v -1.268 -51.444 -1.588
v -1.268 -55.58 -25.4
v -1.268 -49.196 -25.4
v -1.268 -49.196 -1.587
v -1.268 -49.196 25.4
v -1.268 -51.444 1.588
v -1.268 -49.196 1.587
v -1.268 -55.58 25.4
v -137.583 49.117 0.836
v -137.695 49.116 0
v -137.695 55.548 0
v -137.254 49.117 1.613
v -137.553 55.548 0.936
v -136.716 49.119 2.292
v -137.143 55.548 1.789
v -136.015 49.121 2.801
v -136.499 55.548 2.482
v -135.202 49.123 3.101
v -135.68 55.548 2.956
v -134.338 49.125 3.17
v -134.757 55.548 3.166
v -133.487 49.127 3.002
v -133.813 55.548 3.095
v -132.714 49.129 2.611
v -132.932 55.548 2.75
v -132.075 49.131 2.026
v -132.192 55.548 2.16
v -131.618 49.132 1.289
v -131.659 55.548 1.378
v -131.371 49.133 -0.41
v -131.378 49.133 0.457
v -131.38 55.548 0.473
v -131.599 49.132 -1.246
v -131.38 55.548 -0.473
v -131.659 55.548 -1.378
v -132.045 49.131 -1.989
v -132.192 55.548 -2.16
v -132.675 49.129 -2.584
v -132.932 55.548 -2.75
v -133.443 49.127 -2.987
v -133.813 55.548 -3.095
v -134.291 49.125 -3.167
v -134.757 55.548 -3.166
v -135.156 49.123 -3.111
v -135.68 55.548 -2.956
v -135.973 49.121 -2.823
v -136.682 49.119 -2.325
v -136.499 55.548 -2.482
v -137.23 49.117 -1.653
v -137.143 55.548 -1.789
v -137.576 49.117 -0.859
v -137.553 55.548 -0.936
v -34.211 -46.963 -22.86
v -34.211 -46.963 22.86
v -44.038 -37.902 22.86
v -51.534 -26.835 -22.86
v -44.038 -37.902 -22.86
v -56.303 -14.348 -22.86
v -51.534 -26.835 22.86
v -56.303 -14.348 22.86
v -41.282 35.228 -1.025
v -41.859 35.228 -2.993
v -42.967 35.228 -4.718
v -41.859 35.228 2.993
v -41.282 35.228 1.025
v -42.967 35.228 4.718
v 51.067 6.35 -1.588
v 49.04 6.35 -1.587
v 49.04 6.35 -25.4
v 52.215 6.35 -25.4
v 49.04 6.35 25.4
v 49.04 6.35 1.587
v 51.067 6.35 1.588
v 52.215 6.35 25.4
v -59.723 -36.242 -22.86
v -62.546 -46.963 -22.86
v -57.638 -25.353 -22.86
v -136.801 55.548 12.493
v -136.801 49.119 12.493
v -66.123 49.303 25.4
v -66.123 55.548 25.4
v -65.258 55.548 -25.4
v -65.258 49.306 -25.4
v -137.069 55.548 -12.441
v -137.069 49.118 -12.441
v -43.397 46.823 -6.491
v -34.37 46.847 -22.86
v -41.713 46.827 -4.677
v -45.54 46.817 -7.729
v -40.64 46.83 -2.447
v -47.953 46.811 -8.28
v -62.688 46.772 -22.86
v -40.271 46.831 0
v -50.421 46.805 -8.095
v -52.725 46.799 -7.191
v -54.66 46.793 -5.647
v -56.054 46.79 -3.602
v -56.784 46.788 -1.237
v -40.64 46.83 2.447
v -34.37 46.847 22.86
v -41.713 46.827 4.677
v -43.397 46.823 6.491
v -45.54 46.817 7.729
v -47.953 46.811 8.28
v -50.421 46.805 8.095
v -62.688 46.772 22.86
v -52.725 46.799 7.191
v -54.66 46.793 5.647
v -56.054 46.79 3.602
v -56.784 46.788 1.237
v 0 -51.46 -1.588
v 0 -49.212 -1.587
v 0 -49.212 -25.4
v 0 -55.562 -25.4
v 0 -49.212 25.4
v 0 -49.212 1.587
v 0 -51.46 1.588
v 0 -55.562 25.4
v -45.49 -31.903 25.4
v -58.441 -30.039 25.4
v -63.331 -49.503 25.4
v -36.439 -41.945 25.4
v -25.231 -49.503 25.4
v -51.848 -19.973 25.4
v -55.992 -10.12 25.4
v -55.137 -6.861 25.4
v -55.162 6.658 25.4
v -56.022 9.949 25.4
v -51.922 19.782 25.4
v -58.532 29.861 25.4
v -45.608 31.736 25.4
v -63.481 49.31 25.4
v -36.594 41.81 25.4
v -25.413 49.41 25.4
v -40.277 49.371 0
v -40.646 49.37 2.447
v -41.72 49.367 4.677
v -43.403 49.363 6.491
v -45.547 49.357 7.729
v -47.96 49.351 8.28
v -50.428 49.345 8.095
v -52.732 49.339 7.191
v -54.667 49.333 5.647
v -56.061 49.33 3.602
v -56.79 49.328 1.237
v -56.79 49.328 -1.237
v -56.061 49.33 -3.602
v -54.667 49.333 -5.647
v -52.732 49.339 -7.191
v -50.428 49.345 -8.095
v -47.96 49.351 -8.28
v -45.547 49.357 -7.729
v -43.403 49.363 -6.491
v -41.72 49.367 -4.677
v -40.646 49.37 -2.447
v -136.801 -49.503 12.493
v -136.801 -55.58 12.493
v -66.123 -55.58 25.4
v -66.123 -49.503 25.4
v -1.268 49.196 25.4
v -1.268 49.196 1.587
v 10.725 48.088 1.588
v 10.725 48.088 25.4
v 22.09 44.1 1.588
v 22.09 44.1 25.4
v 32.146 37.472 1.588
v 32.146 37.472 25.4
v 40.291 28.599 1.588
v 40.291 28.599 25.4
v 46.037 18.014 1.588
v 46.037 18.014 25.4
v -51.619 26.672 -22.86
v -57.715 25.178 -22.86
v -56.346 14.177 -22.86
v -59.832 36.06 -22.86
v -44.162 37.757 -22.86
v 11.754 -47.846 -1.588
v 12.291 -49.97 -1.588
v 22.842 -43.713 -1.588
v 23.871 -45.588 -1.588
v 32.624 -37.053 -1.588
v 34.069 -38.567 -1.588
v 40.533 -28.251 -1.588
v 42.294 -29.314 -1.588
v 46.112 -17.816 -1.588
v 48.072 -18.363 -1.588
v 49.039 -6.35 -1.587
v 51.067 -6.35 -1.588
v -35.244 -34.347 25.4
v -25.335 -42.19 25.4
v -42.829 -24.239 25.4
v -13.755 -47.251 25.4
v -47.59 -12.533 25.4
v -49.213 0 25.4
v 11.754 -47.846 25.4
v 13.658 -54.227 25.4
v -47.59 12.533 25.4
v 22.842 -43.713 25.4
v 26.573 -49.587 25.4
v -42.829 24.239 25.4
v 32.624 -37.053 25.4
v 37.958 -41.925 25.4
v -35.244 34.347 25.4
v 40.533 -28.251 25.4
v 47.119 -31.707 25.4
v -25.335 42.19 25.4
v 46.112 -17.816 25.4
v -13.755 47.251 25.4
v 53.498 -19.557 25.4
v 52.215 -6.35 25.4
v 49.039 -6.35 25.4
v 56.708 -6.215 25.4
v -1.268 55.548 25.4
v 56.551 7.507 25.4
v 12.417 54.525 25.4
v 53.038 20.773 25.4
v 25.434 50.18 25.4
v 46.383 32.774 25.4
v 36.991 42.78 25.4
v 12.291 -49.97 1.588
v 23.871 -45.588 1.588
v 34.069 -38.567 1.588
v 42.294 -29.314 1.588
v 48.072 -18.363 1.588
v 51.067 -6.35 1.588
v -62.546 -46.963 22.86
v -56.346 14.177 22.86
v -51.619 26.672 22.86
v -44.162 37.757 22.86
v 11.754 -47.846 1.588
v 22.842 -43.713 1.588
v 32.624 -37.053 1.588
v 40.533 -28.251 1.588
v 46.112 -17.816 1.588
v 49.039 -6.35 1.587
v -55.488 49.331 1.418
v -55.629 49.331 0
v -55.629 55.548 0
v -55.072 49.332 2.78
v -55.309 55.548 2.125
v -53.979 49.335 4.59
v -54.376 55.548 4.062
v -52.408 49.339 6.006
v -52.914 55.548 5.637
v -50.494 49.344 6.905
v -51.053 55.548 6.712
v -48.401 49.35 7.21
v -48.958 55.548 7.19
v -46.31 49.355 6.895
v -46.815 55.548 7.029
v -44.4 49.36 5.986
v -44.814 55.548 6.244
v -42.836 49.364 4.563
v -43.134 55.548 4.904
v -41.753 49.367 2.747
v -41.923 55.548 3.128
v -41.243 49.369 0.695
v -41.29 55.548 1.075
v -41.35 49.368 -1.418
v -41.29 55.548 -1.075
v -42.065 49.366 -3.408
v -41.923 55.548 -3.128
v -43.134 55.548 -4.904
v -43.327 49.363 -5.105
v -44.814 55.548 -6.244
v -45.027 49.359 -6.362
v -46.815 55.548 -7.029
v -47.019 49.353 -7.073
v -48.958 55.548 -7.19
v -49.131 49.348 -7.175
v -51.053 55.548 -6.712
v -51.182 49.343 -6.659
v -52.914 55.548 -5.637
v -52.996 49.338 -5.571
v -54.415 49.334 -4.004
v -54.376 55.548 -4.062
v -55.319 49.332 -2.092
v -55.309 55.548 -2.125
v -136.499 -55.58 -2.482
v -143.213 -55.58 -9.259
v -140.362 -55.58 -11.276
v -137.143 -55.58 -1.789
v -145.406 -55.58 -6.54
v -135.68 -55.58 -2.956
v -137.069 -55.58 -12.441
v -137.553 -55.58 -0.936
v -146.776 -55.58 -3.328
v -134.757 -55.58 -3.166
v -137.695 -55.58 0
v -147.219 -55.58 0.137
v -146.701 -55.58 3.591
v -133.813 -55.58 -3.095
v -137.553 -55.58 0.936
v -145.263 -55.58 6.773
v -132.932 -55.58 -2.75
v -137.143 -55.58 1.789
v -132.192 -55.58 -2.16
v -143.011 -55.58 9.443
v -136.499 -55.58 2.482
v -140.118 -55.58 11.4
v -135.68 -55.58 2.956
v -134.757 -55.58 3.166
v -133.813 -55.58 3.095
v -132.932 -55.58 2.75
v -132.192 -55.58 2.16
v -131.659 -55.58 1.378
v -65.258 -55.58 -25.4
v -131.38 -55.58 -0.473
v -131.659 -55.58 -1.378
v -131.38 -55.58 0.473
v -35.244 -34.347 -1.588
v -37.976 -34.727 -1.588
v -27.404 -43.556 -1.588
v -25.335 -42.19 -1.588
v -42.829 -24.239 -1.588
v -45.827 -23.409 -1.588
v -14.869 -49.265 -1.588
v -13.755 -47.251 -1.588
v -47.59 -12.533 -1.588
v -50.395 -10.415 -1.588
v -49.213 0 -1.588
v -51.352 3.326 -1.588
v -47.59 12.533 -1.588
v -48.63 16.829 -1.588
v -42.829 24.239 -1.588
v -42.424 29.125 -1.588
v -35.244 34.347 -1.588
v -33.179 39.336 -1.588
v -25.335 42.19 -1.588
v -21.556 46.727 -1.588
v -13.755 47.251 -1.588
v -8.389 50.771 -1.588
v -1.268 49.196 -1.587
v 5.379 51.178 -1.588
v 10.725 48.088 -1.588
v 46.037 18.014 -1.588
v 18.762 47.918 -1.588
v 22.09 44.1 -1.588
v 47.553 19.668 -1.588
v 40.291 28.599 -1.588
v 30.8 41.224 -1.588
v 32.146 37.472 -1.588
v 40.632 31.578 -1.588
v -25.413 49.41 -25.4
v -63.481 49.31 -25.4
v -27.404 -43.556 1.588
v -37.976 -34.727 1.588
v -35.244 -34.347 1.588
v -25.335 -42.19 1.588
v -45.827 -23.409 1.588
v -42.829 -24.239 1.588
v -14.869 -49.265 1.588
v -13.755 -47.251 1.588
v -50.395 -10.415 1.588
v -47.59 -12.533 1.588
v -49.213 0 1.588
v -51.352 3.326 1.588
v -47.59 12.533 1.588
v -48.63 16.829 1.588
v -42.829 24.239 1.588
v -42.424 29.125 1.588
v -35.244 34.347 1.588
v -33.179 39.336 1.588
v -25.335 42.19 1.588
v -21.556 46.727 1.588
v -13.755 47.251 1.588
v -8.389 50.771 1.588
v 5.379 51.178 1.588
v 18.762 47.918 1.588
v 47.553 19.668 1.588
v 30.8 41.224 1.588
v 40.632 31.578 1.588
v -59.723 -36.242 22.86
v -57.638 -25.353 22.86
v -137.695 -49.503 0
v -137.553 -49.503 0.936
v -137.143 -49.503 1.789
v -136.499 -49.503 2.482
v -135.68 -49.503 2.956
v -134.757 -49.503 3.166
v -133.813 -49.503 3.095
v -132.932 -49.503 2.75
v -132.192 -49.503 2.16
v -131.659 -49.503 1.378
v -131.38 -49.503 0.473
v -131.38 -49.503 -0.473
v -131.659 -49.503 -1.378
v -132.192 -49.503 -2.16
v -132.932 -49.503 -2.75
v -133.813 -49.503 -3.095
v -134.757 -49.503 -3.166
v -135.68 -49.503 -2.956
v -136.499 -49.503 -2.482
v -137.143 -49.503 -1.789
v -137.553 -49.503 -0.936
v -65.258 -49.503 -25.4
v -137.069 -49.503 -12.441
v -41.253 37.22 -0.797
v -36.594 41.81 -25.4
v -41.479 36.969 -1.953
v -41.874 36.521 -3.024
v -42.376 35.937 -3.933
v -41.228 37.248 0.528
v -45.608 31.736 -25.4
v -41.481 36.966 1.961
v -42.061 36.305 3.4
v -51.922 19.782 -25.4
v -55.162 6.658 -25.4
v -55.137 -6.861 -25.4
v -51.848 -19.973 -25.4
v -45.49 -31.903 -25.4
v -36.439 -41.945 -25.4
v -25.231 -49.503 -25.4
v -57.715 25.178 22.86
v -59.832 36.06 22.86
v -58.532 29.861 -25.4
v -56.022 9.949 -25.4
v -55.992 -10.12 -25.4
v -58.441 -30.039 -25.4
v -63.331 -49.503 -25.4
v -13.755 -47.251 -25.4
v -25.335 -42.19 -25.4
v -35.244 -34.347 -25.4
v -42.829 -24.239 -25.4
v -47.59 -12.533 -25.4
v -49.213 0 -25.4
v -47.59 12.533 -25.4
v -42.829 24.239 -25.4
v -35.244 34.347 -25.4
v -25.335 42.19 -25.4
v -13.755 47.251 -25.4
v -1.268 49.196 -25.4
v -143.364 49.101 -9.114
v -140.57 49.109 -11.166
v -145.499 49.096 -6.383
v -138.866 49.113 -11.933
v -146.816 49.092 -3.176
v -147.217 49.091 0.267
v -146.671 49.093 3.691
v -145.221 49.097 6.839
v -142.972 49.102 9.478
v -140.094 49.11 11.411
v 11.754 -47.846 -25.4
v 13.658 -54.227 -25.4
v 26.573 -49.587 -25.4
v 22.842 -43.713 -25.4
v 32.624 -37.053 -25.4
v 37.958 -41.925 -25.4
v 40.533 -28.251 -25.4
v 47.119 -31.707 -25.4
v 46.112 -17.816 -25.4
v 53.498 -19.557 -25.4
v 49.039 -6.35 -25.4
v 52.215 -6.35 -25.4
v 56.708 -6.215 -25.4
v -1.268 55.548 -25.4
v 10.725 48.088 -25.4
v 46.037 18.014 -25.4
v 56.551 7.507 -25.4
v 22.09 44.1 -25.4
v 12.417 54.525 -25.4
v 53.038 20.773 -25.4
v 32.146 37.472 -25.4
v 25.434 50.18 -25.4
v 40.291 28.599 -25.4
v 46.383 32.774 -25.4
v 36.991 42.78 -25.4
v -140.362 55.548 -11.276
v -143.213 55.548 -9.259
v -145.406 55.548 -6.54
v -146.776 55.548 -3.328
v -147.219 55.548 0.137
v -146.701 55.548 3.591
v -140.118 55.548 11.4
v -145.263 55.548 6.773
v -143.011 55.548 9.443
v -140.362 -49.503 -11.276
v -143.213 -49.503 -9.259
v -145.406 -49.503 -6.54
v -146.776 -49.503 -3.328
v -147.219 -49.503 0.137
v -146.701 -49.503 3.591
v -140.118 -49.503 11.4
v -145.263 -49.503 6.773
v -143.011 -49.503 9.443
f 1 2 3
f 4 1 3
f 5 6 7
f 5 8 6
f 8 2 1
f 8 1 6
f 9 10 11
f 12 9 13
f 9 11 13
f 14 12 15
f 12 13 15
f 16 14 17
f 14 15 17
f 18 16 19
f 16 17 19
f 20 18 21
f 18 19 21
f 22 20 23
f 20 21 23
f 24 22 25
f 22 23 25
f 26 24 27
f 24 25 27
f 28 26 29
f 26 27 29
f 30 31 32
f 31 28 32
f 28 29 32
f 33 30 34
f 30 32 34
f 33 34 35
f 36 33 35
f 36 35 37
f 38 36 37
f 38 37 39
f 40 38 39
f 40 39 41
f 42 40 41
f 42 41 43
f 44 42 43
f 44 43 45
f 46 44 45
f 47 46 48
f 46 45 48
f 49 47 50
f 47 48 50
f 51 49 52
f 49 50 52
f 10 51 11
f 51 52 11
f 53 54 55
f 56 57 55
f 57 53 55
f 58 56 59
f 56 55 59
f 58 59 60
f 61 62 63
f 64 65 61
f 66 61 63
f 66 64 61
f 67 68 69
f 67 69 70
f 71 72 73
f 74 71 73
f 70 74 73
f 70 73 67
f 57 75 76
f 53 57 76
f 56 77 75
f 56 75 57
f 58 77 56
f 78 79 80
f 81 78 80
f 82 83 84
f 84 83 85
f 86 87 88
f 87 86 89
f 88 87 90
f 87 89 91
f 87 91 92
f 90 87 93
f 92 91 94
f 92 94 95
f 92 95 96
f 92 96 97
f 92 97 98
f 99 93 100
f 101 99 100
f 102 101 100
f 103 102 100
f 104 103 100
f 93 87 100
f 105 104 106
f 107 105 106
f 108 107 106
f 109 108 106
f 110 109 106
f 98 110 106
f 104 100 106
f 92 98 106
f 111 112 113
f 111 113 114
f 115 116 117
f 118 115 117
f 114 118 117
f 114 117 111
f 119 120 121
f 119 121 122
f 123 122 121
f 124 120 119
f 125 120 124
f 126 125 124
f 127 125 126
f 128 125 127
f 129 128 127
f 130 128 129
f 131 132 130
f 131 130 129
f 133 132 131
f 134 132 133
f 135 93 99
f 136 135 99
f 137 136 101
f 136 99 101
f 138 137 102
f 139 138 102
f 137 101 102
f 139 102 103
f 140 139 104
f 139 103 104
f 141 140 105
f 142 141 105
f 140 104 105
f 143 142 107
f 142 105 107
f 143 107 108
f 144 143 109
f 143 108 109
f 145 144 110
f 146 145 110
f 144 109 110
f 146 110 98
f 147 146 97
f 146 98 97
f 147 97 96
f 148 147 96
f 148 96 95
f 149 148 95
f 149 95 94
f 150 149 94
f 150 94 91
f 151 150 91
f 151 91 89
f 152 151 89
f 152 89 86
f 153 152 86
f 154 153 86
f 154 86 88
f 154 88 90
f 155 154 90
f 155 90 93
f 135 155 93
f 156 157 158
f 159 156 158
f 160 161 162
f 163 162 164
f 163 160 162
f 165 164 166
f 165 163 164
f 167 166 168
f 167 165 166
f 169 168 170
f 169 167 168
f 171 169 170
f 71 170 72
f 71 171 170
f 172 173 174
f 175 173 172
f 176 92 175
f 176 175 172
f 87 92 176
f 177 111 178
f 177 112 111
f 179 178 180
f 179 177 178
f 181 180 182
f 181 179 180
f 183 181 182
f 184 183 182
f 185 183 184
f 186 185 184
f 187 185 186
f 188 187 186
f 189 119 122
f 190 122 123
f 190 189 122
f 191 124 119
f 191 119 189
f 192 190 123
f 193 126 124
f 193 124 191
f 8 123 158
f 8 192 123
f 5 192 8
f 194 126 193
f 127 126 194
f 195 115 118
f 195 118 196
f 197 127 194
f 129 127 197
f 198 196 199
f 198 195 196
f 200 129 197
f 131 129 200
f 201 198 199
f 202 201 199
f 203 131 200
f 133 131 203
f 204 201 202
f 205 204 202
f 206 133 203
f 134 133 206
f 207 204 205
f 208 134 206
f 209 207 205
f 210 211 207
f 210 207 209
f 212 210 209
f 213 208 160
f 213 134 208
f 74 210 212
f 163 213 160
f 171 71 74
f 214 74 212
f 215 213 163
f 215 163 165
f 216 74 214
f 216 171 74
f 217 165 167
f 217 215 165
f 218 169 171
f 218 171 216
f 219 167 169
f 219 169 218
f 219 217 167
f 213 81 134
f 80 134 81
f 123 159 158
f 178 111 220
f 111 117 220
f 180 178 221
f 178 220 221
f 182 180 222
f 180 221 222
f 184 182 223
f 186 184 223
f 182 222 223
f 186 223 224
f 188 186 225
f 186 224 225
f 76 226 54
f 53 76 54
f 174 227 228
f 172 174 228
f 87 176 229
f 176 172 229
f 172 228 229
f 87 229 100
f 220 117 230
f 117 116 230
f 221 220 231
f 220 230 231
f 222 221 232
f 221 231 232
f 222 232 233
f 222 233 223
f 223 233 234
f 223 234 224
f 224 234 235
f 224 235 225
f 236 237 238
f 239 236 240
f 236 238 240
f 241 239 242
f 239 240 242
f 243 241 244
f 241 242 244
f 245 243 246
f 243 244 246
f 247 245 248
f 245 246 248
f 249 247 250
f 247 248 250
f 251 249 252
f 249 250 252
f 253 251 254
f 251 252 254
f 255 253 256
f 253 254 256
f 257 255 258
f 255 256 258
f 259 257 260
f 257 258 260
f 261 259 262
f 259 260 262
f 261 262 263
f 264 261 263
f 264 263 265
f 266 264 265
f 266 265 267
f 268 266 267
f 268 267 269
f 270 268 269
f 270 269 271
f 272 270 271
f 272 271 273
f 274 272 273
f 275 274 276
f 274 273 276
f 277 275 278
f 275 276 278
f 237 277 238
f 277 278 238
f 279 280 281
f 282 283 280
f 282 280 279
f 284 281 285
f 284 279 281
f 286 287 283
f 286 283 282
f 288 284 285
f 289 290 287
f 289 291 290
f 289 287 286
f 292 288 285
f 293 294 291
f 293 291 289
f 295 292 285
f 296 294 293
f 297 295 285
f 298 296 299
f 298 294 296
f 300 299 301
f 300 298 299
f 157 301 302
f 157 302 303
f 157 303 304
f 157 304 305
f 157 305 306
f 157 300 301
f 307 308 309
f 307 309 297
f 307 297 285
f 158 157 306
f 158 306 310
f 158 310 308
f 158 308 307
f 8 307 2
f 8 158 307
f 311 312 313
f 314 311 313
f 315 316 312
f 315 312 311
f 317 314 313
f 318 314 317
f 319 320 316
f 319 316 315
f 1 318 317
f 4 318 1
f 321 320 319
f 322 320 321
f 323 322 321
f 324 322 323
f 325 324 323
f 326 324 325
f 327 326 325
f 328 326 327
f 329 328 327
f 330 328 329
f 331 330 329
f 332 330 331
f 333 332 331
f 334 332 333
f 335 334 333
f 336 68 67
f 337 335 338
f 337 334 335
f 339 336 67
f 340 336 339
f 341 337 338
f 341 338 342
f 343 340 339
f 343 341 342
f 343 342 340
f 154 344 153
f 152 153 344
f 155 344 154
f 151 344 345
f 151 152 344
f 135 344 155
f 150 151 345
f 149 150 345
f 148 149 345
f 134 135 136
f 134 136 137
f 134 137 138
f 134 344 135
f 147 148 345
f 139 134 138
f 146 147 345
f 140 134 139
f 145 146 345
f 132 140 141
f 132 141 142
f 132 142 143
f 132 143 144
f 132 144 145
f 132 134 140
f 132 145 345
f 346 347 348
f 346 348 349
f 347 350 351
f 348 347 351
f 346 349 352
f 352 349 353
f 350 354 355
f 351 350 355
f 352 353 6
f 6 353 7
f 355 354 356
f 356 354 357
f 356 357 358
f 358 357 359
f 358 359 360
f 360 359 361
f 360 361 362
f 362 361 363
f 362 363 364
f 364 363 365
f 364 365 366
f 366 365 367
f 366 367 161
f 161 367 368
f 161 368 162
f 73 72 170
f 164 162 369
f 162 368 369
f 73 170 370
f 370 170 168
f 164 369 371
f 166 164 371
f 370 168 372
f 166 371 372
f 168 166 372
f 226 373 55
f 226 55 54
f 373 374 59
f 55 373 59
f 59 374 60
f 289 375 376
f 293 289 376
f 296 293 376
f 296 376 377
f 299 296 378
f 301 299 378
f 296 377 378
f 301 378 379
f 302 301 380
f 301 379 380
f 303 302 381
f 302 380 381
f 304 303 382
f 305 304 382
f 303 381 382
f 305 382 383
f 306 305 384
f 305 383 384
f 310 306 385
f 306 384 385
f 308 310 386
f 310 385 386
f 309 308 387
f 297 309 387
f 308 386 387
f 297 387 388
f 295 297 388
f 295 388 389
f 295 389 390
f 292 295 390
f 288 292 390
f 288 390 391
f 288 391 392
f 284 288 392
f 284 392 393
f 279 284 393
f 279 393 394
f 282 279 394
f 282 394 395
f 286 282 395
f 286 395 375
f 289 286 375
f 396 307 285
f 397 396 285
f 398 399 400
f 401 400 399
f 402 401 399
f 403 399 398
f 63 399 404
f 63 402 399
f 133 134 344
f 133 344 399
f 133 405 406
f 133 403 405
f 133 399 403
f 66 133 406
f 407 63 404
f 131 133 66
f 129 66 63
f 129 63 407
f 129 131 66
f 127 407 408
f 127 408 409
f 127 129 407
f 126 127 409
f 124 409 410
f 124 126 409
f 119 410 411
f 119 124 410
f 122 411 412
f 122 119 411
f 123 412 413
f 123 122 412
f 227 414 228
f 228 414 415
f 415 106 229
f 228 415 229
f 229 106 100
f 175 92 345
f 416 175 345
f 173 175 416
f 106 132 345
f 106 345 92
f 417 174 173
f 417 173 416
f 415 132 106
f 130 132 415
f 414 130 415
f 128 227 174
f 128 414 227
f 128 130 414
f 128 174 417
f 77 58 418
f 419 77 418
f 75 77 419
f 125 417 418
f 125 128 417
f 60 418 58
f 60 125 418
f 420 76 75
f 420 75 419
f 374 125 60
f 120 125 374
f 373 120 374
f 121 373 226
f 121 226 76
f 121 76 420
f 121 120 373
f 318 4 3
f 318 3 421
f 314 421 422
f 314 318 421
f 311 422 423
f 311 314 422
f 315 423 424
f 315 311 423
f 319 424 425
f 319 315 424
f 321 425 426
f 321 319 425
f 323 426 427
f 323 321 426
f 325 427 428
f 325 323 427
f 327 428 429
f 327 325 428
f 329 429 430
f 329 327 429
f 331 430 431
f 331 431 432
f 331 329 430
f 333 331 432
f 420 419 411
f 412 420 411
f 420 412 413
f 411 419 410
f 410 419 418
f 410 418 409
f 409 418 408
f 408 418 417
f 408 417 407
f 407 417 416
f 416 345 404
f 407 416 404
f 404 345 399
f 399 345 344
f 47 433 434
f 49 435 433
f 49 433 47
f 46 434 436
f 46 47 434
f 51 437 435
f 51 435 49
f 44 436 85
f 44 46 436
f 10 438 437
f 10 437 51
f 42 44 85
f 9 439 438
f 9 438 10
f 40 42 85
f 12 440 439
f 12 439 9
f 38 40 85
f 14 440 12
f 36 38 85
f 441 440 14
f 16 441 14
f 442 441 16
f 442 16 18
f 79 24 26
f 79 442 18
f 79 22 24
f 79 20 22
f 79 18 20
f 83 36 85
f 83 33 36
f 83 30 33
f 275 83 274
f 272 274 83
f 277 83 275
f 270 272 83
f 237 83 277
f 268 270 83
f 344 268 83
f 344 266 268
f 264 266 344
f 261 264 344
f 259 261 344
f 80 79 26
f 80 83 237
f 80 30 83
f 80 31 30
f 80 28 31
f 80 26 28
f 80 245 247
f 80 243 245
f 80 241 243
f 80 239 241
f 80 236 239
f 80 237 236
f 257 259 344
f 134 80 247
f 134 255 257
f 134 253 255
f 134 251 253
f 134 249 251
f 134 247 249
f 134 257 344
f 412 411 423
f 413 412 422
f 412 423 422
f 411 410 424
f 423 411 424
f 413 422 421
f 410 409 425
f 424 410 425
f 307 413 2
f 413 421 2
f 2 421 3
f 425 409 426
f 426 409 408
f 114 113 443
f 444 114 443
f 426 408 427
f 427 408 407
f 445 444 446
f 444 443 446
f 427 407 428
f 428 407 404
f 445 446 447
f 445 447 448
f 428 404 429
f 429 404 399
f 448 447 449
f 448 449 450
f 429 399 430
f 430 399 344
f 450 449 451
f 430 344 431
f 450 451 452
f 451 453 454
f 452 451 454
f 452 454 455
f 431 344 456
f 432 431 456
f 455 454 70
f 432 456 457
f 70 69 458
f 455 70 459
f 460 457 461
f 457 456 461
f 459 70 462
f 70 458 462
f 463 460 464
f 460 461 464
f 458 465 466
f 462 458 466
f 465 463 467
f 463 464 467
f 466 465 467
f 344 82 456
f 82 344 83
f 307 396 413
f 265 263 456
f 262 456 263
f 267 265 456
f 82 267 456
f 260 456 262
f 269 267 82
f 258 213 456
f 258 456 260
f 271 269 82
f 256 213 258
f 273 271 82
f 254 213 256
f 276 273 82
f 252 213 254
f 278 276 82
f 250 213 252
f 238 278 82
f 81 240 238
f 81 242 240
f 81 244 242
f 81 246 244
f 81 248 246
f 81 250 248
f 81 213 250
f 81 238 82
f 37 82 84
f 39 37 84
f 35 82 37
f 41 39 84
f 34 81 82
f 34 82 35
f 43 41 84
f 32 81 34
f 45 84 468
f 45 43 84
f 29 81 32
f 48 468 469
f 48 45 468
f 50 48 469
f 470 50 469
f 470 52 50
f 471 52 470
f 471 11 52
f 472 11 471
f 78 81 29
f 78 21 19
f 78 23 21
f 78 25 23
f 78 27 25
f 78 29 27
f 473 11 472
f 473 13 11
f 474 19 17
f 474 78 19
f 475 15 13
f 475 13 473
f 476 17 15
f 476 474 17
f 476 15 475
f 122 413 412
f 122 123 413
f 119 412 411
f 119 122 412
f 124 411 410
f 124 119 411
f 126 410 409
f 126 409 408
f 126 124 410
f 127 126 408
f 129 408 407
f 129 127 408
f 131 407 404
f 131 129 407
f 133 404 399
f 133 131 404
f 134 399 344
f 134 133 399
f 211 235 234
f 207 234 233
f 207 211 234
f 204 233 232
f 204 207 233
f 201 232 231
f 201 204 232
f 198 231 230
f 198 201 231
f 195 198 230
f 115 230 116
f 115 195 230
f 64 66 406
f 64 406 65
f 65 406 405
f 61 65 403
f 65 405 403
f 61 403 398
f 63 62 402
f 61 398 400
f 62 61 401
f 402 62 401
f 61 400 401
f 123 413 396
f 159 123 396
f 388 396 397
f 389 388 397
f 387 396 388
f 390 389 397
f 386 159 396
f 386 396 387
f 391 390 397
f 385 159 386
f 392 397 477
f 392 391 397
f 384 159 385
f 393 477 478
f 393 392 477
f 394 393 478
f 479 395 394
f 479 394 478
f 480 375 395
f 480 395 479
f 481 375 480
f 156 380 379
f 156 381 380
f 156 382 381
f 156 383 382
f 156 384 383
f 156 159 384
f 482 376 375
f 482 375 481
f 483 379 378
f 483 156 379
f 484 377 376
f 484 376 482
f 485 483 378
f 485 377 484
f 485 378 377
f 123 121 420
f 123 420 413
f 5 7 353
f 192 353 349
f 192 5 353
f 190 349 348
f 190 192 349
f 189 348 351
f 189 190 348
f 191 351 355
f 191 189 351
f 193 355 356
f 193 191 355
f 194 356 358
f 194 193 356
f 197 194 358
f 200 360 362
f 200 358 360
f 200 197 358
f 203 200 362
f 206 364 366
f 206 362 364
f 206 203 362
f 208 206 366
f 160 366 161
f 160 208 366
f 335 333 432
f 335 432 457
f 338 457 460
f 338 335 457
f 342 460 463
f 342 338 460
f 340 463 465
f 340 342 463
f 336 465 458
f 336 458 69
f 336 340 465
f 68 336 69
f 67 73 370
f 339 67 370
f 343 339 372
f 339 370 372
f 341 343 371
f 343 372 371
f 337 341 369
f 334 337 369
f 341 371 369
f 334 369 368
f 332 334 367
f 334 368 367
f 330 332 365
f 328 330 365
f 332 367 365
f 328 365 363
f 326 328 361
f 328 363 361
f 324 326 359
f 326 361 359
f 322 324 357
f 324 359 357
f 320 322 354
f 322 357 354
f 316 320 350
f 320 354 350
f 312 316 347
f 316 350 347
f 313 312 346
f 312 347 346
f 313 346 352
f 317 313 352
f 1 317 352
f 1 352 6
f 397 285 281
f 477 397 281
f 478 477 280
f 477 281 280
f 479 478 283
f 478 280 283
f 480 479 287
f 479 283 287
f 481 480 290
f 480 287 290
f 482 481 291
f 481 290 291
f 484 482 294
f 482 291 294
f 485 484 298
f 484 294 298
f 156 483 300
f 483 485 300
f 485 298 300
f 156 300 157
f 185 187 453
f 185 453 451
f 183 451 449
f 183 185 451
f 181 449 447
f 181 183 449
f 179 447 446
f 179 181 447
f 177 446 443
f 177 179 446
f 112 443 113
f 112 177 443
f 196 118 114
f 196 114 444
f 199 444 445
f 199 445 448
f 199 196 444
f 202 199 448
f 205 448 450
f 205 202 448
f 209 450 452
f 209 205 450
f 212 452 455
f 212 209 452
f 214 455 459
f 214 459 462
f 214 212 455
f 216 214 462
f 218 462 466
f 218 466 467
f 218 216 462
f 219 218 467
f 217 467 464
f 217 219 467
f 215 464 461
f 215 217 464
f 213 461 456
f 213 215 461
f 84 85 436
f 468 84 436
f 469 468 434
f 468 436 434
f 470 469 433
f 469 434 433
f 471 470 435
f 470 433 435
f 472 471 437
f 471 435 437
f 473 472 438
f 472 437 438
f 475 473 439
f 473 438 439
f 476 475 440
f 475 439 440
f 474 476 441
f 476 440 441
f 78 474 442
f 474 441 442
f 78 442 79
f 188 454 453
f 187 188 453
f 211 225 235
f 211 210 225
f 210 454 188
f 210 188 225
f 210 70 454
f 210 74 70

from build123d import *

# Parameters (mm, degrees)
F1_DEPTH  = 25.4
F3_DEPTH  = 25.4
F4_DEPTH  = 25.4
F7_DEPTH  = 120.65
F8_R      = 3.175
F9_DEPTH  = 114.3
F10_R     = 51.4598077904
F11_DEPTH = 1.5875
F12_T     = 2.54
F13_R     = 7.2100131565
F14_DEPTH = 20.32
F15_R     = 8.3028862555
F16_DEPTH = 17.78


# Not quite as in the source:
# - a shell that OpenCascade refuses in one call is made with other operations: the cavity is built on its own and cut out
# - the program builds the solid bodies; features that only make, move or delete a surface that nothing else refers to are left out


with BuildPart() as f1:
    # F0 (on Top) → F1 (new body, symmetric)
    with BuildSketch(Plane.XY):
        with BuildLine():
            ThreePointArc((-1.2680592233, -49.1961602369), (-49.2125, 0), (-1.2680592233, 49.1961602369))
            Line((-1.2680592233, 49.1961602369), (-1.2680592233, 55.5480281563))
            Line((-1.2680592233, 55.5480281563), (-147.3180592233, 55.5480281563))
            Line((-147.3180592233, 55.5480281563), (-147.3180592233, 49.091055685))
            Line((-147.3180592233, 49.091055685), (-63.4814364191, 49.3103835326))
            Line((-63.4814364191, 49.3103835326), (-25.4134971885, 49.4099743665))
            ThreePointArc((-25.4134971885, 49.4099743665), (-55.5624058885, -0.1022650226), (-25.2314432137, -49.5031885802))
            Line((-25.2314432137, -49.5031885802), (-63.3314432137, -49.5031885802))
            Line((-63.3314432137, -49.5031885802), (-69.6814432137, -49.5031885802))
            Line((-69.6814432137, -49.5031885802), (-147.3180592233, -49.5031885802))
            Line((-147.3180592233, -49.5031885802), (-147.3180592233, -55.5800534785))
            Line((-147.3180592233, -55.5800534785), (-1.2680592233, -55.5800534785))
            Line((-1.2680592233, -55.5800534785), (-1.2680592233, -49.1961602369))
        make_face()
    extrude(amount=F1_DEPTH, both=True)

    # F0 (on Top) → F4 (join, symmetric)
    with BuildSketch(Plane.XY):
        with BuildLine():
            ThreePointArc((49.0389416617, -6.35), (32.6236991353, -37.0532891725), (0, -49.2125))
            Line((0, -49.2125), (0, -55.5625))
            ThreePointArc((0, -55.5625), (57.0543020001, 0.6511375212), (-1.2680592233, 55.5480281563))
            Line((-1.2680592233, 55.5480281563), (-1.2680592233, 49.1961602369))
            ThreePointArc((-1.2680592233, 49.1961602369), (32.1458766832, 37.4716025001), (49.0397283671, 6.35))
            Line((49.0397283671, 6.35), (52.2147283671, 6.35))
            Line((52.2147283671, 6.35), (52.2147283671, -6.35))
            Line((52.2147283671, -6.35), (49.0389416617, -6.35))
        make_face()
    extrude(amount=F4_DEPTH, both=True)

    # F6 (on face) → F7 (cut)
    with BuildSketch(Plane.XZ.offset(55.5800534785)):
        with BuildLine():
            ThreePointArc((-137.0693669386, -12.441398865), (-147.2188088745, 0.1366940896), (-136.8009702954, 12.493402119))
            Line((-136.8009702954, 12.493402119), (-66.122660171, 25.4))
            Line((-66.122660171, 25.4), (-147.3180592233, 25.4))
            Line((-147.3180592233, 25.4), (-147.3180592233, -25.4))
            Line((-147.3180592233, -25.4), (-65.2581656686, -25.4))
            Line((-65.2581656686, -25.4), (-137.0693669386, -12.441398865))
        make_face()
    extrude(amount=-F7_DEPTH, mode=Mode.SUBTRACT)

    # F8 (on face) → F9 (cut)
    with BuildSketch(Plane(origin=(0, 55.5480281563, 0), x_dir=(-1, 0, 0), z_dir=(0, 1, 0))):
        with Locations((134.5195445365, 0)):
            Circle(F8_R)
    extrude(amount=-F9_DEPTH, mode=Mode.SUBTRACT)

    # F10 (on Top) → F11 (cut, symmetric)
    with BuildSketch(Plane.XY):
        Circle(F10_R)
    extrude(amount=F11_DEPTH, both=True, mode=Mode.SUBTRACT)

    # F13 (on face) → F14 (cut)
    with BuildSketch(Plane(origin=(0, 55.5480281563, 0), x_dir=(-1, 0, 0), z_dir=(0, 1, 0))):
        with Locations((48.4190694988, 0)):
            Circle(F13_R)
    extrude(amount=-F14_DEPTH, mode=Mode.SUBTRACT)


with BuildPart() as f3:
    # F0 (on Top) → F3 (new body, symmetric)
    with BuildSketch(Plane.XY):
        with BuildLine():
            Line((-25.4134971885, 49.4099743665), (-63.4814364191, 49.3103835326))
            ThreePointArc((-63.4814364191, 49.3103835326), (-55.6963964132, -0.0846991302), (-63.3314432137, -49.5031885802))
            Line((-63.3314432137, -49.5031885802), (-25.2314432137, -49.5031885802))
            ThreePointArc((-25.2314432137, -49.5031885802), (-55.5624058885, -0.1022650226), (-25.4134971885, 49.4099743665))
        make_face()
    extrude(amount=F3_DEPTH, both=True)

    # F12: shell of thickness 2.54, made by hand


with BuildPart() as f12_core1:
    # F12_t2: copy of F3
    add(f3.part)

    # the walls: a layer under each face that stays
    f12_faces = [f12_core1.faces().sort_by_distance(p)[0] for p in [
        (-44.2814432137, -49.5031885802, 0),
        (-44.4474668038, 49.3601789496, 0),
        (-57.1064375515, -33.0176614224, 25.4),
        (-55.5624058885, -0.1022650226, 0),
        (-57.1064375515, -33.0176614224, -25.4),
    ]]
    thicken(f12_faces, amount=-F12_T, mode=Mode.SUBTRACT)


with BuildPart() as f3_1:
    add(f3.part)

    # what is left inside the walls is the cavity
    f12_cavity = [f12_core1.part.solids().sort_by_distance(p)[0] for p in [
        (-48.126372, -32.599157, -7.62),
        (-48.23108, 32.444039, -7.62),
    ]]
    add(f12_cavity, mode=Mode.SUBTRACT)

    # F15 (on face) → F16 (cut)
    with BuildSketch(Plane(origin=(-0.122791209, 46.9361295528, 0), x_dir=(0.9999965779, 0.0026161251, 0), z_dir=(0.0026161251, -0.9999965779, 0))):
        with Locations((-48.4509207308, 0)):
            Circle(F15_R)
    extrude(amount=-F16_DEPTH, mode=Mode.SUBTRACT)


solid = Compound([f1.part, f3_1.part])
